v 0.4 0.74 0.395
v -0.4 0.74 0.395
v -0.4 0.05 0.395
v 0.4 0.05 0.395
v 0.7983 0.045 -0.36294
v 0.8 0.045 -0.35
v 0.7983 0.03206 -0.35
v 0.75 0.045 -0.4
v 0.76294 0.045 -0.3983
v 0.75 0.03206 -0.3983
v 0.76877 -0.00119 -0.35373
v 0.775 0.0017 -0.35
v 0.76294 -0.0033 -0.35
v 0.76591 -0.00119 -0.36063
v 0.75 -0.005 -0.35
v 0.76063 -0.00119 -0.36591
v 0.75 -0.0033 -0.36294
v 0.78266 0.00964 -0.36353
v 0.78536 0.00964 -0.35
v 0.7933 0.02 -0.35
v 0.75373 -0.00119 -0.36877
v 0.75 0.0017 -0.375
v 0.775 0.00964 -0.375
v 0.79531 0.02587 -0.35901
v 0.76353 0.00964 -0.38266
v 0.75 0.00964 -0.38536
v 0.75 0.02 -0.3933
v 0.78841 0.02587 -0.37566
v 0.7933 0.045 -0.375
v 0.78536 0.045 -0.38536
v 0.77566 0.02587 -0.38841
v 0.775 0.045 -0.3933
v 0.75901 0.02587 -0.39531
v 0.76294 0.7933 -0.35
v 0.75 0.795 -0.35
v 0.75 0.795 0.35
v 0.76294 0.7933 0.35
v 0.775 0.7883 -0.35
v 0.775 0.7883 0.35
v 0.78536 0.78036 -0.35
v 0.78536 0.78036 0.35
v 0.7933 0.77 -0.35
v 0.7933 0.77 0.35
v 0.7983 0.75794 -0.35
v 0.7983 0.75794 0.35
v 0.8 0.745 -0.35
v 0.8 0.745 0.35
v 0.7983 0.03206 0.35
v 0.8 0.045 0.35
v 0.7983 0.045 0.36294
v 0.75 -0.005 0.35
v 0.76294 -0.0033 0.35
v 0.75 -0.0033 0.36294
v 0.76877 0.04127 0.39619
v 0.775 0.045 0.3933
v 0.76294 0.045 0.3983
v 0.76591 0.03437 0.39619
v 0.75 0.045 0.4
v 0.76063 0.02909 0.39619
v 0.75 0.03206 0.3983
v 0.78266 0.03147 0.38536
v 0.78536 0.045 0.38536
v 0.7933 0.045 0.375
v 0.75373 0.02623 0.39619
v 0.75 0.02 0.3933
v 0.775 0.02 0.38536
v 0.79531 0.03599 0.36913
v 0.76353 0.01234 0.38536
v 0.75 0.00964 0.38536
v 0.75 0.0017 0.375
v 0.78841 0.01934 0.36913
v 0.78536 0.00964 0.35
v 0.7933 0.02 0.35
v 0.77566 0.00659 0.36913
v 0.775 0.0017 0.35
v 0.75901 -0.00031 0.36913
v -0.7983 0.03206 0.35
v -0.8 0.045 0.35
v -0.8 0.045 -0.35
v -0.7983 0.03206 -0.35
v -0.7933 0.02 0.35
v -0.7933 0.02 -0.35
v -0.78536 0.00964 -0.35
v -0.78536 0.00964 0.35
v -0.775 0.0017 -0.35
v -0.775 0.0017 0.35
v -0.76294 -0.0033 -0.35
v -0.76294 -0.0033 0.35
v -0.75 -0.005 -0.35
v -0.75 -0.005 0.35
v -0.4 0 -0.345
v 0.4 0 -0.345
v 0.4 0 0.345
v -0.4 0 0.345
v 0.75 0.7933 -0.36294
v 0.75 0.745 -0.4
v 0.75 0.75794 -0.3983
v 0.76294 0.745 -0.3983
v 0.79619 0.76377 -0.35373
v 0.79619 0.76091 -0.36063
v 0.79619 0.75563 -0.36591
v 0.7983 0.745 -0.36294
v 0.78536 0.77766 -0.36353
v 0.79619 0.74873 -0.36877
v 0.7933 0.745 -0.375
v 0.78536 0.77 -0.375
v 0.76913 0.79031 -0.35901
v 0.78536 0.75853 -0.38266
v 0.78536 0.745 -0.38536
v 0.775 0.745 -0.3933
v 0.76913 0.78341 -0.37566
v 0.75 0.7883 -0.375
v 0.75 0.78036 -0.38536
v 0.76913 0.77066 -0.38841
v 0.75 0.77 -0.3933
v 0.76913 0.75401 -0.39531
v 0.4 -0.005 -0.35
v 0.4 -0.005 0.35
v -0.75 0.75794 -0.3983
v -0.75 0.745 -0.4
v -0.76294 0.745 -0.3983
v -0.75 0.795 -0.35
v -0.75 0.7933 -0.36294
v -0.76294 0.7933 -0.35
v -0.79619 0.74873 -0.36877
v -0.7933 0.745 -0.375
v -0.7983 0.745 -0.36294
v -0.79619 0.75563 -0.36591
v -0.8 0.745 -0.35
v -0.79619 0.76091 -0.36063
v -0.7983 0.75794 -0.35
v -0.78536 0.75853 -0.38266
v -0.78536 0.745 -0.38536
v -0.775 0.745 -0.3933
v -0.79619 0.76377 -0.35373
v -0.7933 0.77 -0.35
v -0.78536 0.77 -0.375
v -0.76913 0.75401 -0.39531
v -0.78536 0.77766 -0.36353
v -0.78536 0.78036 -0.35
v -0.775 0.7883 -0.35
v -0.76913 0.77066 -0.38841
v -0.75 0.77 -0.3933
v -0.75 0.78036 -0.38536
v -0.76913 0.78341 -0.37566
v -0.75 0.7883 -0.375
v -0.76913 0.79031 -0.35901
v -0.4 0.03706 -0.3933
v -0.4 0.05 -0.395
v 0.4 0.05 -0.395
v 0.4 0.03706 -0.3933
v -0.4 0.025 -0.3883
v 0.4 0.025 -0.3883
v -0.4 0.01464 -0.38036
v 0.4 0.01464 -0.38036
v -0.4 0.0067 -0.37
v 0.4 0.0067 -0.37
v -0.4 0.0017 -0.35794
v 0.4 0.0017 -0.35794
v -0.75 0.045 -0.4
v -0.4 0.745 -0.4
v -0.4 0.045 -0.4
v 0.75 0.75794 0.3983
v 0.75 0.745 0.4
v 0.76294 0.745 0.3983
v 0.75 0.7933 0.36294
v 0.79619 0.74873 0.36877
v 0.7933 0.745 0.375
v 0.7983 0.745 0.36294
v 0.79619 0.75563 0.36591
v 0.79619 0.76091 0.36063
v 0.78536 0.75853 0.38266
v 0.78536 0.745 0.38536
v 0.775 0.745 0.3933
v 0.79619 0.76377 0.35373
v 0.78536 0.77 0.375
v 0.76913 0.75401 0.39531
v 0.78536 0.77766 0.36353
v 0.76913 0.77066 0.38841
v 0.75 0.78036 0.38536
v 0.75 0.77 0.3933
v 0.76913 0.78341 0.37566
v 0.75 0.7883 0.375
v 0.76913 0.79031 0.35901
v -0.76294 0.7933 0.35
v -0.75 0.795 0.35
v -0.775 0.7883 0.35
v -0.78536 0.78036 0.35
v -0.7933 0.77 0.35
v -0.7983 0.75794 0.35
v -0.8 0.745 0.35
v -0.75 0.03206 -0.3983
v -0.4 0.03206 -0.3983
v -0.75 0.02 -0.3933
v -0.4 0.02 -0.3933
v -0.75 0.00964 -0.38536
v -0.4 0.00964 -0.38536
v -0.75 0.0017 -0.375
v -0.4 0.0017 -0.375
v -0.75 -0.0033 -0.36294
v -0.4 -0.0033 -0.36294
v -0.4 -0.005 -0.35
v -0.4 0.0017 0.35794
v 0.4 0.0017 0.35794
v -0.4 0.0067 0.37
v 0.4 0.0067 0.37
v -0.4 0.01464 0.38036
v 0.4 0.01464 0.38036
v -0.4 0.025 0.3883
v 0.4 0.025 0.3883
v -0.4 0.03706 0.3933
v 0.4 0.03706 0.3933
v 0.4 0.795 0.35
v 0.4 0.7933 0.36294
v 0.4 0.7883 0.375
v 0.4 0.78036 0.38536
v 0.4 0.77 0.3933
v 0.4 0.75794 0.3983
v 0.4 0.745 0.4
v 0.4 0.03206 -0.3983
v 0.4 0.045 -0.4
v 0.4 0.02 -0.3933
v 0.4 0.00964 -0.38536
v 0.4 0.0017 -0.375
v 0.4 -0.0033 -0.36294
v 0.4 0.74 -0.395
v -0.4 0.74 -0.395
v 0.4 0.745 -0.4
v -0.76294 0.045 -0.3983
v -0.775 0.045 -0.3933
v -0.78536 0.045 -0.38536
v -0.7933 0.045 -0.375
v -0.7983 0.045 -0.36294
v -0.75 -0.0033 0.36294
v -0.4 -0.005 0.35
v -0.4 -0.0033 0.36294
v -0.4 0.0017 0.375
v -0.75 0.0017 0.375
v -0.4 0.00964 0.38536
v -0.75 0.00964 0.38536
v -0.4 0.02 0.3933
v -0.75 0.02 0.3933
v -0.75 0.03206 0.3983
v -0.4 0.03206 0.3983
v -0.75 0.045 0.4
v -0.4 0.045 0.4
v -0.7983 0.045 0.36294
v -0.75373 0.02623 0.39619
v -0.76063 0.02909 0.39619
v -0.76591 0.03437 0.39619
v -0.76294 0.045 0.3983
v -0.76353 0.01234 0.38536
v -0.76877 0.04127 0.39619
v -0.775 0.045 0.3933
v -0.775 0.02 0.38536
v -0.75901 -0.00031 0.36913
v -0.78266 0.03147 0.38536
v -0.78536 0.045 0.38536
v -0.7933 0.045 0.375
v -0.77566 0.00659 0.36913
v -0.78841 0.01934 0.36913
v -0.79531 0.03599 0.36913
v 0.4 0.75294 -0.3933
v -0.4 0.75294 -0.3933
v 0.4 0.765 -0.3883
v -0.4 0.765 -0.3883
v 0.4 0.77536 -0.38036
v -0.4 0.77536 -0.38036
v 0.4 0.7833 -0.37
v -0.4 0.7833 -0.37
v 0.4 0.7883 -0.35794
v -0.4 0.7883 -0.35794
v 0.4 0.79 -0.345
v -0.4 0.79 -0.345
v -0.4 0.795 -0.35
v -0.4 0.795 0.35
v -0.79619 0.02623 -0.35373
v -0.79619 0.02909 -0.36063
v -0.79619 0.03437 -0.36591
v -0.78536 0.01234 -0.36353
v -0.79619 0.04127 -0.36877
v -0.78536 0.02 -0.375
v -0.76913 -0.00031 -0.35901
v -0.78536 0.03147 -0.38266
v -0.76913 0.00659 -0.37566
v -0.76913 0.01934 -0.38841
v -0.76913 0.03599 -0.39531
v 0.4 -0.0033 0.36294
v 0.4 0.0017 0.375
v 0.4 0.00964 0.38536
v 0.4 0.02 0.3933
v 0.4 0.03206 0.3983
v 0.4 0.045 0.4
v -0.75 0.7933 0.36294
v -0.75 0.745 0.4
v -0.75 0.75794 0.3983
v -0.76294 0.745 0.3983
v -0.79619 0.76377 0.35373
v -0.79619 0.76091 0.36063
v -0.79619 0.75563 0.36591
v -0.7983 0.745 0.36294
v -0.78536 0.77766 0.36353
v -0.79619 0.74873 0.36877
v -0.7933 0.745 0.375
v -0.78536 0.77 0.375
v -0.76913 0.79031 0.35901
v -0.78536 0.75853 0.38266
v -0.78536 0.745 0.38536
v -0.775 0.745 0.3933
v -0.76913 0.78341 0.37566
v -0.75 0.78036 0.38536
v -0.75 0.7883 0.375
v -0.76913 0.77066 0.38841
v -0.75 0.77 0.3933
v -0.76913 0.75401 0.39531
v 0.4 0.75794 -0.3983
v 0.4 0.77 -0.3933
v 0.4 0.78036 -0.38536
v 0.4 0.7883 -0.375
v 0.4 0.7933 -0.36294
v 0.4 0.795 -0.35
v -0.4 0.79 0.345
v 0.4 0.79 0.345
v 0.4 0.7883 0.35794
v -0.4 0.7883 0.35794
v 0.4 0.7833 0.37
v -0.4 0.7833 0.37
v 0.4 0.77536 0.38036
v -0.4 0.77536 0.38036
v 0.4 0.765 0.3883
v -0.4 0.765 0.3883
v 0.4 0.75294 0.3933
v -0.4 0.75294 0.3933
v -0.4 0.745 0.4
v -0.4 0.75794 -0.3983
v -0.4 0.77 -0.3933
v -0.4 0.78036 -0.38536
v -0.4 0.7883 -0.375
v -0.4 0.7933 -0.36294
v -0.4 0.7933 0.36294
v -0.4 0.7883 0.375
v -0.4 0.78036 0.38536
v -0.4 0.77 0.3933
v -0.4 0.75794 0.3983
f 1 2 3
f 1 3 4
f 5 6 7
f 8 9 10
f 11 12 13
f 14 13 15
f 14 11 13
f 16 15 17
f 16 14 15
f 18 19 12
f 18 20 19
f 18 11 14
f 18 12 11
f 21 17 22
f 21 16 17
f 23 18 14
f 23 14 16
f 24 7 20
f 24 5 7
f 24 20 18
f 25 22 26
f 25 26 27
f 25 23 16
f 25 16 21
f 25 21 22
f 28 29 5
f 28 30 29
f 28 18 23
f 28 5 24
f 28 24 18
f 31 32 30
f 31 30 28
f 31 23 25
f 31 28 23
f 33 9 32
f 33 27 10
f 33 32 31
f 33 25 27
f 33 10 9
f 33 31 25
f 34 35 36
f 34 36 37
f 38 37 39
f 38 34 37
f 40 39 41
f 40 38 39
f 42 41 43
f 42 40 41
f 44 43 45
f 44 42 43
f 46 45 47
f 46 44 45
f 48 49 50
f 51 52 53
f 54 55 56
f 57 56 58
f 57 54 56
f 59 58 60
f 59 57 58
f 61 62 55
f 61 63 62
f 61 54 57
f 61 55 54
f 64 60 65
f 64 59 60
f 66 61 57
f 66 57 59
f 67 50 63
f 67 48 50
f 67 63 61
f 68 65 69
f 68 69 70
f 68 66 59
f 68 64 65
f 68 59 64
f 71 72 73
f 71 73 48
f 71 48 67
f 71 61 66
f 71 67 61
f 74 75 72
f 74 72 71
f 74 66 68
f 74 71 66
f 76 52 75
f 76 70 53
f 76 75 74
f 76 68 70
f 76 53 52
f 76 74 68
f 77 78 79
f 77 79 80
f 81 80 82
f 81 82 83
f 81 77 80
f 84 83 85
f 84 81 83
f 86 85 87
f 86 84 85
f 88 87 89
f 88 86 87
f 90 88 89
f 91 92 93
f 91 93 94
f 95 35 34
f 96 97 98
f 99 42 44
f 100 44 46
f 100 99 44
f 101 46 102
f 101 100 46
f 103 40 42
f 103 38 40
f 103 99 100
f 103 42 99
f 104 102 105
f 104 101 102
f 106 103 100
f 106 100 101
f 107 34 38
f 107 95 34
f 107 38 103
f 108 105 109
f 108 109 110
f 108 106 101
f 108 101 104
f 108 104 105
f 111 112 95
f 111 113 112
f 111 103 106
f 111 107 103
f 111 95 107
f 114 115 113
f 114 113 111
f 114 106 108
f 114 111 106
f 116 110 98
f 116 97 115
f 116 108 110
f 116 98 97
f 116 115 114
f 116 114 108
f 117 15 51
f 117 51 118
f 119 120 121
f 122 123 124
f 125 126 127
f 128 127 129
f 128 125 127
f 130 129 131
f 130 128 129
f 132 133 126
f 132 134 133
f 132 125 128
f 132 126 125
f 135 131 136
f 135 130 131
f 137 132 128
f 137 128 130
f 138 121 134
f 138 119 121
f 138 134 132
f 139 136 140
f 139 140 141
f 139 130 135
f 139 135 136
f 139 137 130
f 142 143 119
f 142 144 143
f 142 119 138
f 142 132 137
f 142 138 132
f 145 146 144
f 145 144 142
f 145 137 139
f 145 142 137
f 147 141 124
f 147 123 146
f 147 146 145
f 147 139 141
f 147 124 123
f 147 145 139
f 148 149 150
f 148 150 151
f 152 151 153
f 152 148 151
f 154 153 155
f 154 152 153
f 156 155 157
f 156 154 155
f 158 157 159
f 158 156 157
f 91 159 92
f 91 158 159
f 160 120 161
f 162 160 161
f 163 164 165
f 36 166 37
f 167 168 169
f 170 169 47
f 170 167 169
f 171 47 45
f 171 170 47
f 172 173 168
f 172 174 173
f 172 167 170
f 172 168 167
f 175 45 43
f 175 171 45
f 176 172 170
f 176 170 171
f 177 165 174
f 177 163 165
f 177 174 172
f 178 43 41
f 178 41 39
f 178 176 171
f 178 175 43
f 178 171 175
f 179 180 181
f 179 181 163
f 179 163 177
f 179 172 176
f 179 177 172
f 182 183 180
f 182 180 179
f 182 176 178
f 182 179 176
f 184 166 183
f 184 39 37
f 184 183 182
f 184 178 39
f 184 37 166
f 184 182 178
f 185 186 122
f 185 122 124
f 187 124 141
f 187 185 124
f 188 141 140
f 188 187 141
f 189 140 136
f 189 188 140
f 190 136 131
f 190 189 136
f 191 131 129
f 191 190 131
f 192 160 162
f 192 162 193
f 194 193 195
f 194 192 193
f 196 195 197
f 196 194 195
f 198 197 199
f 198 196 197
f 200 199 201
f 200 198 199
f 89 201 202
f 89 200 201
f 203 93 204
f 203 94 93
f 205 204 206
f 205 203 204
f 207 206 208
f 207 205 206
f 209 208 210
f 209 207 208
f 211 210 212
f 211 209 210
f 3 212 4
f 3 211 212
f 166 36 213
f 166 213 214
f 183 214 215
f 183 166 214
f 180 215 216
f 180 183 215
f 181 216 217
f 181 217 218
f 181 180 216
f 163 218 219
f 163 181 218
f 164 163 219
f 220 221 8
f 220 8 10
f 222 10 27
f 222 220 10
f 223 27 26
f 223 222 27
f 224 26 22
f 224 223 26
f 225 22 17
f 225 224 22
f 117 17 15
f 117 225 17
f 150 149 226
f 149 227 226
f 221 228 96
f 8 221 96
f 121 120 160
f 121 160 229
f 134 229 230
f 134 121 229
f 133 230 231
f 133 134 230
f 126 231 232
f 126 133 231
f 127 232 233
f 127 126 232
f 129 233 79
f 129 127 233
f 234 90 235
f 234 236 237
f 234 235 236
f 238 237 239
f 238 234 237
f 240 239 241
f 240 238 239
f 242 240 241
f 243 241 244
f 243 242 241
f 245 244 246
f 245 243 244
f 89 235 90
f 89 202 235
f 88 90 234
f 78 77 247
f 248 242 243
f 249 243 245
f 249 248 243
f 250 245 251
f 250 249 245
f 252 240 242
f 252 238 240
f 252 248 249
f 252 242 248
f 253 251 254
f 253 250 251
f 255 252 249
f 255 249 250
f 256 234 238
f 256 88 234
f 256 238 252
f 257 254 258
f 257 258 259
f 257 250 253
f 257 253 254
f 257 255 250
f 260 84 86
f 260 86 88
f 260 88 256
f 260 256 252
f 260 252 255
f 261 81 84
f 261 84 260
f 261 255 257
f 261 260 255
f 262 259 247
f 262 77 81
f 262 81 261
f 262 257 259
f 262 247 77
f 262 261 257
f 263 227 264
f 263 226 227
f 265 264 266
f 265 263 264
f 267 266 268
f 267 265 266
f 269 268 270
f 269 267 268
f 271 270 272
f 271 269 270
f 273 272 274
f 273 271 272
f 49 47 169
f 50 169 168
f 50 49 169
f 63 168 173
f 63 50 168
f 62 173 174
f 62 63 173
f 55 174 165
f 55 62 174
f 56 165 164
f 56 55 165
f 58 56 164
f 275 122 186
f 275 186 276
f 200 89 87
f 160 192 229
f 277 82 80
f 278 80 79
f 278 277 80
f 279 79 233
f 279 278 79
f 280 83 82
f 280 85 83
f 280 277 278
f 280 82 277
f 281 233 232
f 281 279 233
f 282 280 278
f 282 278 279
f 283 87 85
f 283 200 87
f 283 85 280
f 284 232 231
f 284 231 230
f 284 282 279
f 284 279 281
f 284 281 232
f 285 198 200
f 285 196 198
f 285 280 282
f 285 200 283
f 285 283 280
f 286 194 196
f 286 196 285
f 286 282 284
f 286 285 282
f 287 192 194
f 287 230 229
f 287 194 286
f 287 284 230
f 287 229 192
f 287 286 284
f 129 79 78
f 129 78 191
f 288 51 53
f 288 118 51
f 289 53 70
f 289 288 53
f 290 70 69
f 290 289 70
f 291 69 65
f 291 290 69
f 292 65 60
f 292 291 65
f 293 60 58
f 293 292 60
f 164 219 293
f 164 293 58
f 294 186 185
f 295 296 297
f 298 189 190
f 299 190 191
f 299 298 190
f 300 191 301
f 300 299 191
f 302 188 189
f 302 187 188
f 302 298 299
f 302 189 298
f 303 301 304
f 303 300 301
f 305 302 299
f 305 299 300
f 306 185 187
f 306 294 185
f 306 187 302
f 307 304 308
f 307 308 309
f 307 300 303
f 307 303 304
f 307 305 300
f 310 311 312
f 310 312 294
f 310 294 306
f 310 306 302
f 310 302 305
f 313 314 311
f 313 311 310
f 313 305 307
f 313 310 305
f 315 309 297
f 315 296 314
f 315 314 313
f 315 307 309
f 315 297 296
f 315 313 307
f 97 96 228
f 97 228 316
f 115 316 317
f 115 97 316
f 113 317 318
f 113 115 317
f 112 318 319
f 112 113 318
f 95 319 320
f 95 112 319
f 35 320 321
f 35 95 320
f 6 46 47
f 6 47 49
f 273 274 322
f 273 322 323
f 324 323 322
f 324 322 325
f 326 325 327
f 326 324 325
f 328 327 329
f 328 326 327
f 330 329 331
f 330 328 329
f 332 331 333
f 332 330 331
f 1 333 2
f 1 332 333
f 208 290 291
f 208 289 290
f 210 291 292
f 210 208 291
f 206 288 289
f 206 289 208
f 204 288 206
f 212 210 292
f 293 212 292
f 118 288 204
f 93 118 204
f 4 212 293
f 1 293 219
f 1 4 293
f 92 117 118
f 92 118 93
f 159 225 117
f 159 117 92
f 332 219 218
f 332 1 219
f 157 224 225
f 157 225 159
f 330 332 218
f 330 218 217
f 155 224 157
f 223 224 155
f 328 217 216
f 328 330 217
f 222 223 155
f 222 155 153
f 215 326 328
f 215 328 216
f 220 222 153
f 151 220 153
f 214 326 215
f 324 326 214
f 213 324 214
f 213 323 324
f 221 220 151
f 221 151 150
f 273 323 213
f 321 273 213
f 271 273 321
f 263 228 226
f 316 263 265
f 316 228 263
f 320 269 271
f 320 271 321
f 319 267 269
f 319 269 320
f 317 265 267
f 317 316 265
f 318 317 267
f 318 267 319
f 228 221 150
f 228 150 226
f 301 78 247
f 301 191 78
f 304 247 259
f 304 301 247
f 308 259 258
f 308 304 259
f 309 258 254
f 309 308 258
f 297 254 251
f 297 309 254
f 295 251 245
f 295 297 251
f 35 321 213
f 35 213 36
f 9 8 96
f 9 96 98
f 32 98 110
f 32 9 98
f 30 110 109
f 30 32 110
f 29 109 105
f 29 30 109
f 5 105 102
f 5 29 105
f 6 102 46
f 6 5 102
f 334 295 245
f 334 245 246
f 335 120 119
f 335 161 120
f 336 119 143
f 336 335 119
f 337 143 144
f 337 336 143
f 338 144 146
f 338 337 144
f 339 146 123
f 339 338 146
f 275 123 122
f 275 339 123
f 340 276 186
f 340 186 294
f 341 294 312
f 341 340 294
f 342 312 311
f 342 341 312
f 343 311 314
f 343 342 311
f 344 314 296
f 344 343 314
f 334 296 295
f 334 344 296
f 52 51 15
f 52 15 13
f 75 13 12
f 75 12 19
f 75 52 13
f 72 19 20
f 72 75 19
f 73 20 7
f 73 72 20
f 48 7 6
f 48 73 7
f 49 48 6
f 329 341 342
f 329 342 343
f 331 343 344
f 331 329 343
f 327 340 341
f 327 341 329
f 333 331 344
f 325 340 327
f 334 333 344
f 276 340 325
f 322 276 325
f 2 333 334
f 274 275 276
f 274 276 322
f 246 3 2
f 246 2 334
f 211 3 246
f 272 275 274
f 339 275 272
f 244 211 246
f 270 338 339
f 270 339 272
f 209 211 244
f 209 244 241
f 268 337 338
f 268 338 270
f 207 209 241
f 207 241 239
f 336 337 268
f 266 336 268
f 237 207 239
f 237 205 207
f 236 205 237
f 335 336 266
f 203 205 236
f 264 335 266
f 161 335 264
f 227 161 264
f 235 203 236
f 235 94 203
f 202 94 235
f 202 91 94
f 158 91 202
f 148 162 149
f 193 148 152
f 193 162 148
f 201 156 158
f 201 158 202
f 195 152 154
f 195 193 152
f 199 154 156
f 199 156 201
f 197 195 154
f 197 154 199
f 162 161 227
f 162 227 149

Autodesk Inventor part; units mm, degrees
ref_plane "YZ Plane" through (0, 0, 0) normal (1, 0, 0) x (0, 1, 0)
ref_plane "XZ Plane" through (0, 0, 0) normal (0, 1, 0) x (-1, 0, 0)
ref_plane "XY Plane" through (0, 0, 0) normal (0, 0, 1) x (1, 0, 0)
sketch "Sketch1" plane through (0, 0, 0) normal (0, 0, 1) x (1, 0, 0)
  line L0 (-0.8, 0.795) -> (-0.4, 0.795)
  line L1 (-0.4, 0.795) -> (-0.4, -0.005)
  line L2 (-0.4, -0.005) -> (-0.8, -0.005)
  line L3 (-0.8, -0.005) -> (-0.8, 0.795)
  line L4 (-0.4, 0.79) -> (0.4, 0.79)
  line L5 (0.4, 0.79) -> (0.4, 0)
  line L6 (0.4, 0) -> (-0.4, 0)
  line L7 (-0.4, 0) -> (-0.4, 0.79)
  line L8 (0.4, 0.795) -> (0.8, 0.795)
  line L9 (0.8, 0.795) -> (0.8, -0.005)
  line L10 (0.8, -0.005) -> (0.4, -0.005)
  line L11 (0.4, -0.005) -> (0.4, 0.795)
  point P0 (0, 0)
  point P1 (0, 0.79)
  point P2 (0, 0)
  dimension "d0" = 1.6
  dimension "d1" = 0.8
  dimension "d2" = 0.4
  dimension "d3" = 0.005
  dimension "d6" = 0.005
extrude "Extrusion1" add sketch "Sketch1" along normal mid plane 0.8 contours L0 L1 L2 L3 | L11 L8 L9 L10 L5
extrude "Extrusion2" add sketch "Sketch1" along normal mid plane 0.79 contours L4 L5 L6 L1
fillet "Fillet2" radius 0.05 4 edges at (0, 0.79, 0.395) (0, 0, 0.395) (0, 0.79, -0.395) (0, 0, -0.395)
fillet "Fillet1" radius 0.05 16 edges at (-0.6, 0.795, 0.4) (0.6, 0.795, 0.4) (-0.6, 0.795, -0.4) (0.6, 0.795, -0.4) (0.8, 0.795, 0) (0.8, 0.395, -0.4) (0.8, -0.005, 0) (0.6, -0.005, -0.4) (0.6, -0.005, 0.4) (0.8, 0.395, 0.4) (-0.6, -0.005, -0.4) (-0.8, -0.005, 0) (-0.8, 0.395, 0.4) (-0.6, -0.005, 0.4) (-0.8, 0.395, -0.4) (-0.8, 0.795, 0)
equation "\"d3\" = d6"
properties part number "Resistor_1608-0.5mm" material "Copper"
